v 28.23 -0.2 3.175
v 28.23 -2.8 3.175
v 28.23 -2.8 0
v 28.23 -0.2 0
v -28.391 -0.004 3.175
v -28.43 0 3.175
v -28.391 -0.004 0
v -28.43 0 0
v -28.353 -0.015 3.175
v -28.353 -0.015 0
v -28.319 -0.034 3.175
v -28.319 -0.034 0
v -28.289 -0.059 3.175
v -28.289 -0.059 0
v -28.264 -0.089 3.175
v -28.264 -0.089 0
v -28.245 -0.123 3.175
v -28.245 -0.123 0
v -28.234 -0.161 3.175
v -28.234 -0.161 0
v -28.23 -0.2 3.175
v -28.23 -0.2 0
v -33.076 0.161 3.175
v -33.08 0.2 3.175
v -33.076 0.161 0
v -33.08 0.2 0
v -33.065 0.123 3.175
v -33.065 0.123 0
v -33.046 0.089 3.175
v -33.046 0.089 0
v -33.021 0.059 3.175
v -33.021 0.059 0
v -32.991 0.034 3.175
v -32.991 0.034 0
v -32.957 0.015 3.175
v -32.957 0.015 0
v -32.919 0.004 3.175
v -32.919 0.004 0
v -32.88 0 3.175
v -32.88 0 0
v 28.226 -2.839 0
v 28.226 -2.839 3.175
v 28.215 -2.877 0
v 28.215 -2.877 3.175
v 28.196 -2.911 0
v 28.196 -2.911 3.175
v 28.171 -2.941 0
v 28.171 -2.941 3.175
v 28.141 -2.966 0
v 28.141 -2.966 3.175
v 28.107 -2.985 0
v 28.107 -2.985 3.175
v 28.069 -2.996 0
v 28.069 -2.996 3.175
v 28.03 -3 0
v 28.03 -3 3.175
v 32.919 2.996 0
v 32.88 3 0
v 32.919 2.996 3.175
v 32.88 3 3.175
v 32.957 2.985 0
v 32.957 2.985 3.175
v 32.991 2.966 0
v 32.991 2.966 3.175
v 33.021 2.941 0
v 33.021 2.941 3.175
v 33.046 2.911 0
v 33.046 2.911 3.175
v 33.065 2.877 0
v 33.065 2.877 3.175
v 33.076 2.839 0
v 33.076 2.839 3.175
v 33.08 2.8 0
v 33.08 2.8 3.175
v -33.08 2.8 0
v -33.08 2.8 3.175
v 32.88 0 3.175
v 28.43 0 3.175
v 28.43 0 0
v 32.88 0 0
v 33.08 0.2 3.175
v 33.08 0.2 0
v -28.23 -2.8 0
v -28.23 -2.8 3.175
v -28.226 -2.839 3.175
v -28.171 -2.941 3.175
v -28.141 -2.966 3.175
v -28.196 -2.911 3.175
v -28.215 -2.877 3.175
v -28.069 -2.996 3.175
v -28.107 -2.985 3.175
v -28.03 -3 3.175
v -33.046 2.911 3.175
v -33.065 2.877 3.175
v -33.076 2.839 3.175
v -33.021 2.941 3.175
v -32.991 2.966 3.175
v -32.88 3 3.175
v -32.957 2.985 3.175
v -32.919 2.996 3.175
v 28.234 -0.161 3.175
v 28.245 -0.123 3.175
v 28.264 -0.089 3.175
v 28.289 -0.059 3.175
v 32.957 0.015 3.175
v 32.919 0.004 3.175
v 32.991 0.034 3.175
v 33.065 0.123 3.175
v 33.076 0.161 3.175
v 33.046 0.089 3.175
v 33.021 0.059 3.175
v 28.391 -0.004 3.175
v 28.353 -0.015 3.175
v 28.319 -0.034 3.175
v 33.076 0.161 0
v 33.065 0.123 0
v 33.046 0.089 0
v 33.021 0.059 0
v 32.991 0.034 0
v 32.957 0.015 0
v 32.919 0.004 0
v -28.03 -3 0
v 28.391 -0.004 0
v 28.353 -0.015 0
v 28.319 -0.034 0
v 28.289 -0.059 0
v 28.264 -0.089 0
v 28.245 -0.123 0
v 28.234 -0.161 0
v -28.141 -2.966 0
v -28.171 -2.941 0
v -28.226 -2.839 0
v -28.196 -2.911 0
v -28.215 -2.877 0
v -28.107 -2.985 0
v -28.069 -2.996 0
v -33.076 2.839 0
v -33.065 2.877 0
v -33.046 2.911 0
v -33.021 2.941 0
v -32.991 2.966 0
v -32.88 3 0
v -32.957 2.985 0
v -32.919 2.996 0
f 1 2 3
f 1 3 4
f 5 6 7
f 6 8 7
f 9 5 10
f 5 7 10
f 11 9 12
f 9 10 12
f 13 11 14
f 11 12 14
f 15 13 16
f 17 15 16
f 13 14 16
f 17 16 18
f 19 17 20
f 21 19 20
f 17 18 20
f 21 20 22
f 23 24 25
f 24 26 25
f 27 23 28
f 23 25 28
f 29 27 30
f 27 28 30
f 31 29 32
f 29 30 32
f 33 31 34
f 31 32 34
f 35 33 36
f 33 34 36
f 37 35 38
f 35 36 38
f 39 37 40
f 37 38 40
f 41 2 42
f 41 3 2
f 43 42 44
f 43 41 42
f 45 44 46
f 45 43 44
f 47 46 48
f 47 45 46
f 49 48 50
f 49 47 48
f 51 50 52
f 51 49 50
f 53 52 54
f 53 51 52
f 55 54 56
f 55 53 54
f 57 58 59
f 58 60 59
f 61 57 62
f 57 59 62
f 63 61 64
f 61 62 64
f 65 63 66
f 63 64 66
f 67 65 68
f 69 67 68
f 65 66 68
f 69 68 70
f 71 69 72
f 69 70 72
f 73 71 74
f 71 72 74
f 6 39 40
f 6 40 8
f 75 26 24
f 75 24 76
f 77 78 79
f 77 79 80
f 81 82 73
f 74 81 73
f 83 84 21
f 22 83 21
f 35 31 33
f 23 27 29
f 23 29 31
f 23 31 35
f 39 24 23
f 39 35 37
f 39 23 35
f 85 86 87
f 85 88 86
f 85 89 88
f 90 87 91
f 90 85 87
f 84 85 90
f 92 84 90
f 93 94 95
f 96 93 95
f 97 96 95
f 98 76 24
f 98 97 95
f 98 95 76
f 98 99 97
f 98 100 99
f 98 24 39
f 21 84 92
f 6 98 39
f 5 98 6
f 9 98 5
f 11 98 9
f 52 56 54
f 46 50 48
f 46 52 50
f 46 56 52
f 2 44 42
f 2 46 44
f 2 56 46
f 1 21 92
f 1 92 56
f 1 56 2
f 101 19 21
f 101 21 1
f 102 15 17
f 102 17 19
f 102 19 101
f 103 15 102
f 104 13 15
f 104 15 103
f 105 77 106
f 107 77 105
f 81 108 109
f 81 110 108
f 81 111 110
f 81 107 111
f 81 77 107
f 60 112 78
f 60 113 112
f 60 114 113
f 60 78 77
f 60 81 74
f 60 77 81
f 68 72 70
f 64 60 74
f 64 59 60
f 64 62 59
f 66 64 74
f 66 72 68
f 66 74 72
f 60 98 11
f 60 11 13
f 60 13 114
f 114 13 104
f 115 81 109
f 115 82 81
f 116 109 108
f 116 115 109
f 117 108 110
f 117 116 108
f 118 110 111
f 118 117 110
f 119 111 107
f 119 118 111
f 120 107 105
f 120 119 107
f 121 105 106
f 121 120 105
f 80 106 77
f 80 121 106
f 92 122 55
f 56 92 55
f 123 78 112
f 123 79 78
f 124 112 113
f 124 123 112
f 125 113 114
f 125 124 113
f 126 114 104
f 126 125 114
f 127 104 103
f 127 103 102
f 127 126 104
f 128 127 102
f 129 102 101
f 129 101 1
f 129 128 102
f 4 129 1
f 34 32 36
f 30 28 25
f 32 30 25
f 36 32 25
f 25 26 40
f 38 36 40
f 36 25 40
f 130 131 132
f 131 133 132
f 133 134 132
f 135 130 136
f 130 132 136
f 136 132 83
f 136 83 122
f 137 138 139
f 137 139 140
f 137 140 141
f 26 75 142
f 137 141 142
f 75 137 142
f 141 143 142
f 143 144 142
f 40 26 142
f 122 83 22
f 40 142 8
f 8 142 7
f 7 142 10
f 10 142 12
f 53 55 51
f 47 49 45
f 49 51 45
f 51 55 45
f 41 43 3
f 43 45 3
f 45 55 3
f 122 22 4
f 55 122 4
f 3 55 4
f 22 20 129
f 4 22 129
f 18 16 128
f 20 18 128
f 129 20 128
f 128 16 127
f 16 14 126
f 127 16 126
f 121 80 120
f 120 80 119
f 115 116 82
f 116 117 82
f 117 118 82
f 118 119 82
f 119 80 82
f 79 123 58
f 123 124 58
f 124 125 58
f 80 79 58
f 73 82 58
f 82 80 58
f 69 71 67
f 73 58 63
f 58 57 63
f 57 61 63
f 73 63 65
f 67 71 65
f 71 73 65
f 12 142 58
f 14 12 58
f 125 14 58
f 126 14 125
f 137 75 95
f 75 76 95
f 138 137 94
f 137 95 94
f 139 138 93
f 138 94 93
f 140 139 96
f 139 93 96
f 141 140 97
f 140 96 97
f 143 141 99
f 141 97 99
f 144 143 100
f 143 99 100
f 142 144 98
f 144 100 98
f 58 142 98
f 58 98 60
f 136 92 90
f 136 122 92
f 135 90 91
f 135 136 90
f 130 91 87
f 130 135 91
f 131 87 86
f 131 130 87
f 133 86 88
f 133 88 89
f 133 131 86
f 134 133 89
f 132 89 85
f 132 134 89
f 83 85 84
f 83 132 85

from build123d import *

# Parameters (mm, degrees)
SKETCH1_W           = 66.16
SKETCH1_H           = 6
BOSS_EXTRUDE1_DEPTH = 3.175
SKETCH2_W           = 4.85
SKETCH2_H           = 3
CUT_EXTRUDE1_DEPTH  = 34.367154883
FILLET1_R           = 0.2


with BuildPart() as part:
    # Sketch1 → Boss-Extrude1 (new body)
    with BuildSketch(Plane.XY):
        Rectangle(SKETCH1_W, SKETCH1_H)
    extrude(amount=BOSS_EXTRUDE1_DEPTH)

    # Sketch2 → Cut-Extrude1 (cut, through all)
    with BuildSketch(Plane.XY.offset(3.175)):
        with Locations((-30.655, -1.5)):
            Rectangle(SKETCH2_W, SKETCH2_H)
        with Locations((30.655, -1.5)):
            Rectangle(SKETCH2_W, SKETCH2_H)
    extrude(amount=-CUT_EXTRUDE1_DEPTH, mode=Mode.SUBTRACT)

    # Fillet1
    fillet1_edges = [part.edges().sort_by_distance(p)[0] for p in [
        (-33.08, 0, 1.5875),
        (-28.23, 0, 1.5875),
        (-28.23, -3, 1.5875),
        (33.08, 0, 1.5875),
        (28.23, -3, 1.5875),
        (28.23, 0, 1.5875),
        (-33.08, 3, 1.5875),
        (33.08, 3, 1.5875),
    ]]
    fillet(fillet1_edges, radius=FILLET1_R)


solid = part.part
